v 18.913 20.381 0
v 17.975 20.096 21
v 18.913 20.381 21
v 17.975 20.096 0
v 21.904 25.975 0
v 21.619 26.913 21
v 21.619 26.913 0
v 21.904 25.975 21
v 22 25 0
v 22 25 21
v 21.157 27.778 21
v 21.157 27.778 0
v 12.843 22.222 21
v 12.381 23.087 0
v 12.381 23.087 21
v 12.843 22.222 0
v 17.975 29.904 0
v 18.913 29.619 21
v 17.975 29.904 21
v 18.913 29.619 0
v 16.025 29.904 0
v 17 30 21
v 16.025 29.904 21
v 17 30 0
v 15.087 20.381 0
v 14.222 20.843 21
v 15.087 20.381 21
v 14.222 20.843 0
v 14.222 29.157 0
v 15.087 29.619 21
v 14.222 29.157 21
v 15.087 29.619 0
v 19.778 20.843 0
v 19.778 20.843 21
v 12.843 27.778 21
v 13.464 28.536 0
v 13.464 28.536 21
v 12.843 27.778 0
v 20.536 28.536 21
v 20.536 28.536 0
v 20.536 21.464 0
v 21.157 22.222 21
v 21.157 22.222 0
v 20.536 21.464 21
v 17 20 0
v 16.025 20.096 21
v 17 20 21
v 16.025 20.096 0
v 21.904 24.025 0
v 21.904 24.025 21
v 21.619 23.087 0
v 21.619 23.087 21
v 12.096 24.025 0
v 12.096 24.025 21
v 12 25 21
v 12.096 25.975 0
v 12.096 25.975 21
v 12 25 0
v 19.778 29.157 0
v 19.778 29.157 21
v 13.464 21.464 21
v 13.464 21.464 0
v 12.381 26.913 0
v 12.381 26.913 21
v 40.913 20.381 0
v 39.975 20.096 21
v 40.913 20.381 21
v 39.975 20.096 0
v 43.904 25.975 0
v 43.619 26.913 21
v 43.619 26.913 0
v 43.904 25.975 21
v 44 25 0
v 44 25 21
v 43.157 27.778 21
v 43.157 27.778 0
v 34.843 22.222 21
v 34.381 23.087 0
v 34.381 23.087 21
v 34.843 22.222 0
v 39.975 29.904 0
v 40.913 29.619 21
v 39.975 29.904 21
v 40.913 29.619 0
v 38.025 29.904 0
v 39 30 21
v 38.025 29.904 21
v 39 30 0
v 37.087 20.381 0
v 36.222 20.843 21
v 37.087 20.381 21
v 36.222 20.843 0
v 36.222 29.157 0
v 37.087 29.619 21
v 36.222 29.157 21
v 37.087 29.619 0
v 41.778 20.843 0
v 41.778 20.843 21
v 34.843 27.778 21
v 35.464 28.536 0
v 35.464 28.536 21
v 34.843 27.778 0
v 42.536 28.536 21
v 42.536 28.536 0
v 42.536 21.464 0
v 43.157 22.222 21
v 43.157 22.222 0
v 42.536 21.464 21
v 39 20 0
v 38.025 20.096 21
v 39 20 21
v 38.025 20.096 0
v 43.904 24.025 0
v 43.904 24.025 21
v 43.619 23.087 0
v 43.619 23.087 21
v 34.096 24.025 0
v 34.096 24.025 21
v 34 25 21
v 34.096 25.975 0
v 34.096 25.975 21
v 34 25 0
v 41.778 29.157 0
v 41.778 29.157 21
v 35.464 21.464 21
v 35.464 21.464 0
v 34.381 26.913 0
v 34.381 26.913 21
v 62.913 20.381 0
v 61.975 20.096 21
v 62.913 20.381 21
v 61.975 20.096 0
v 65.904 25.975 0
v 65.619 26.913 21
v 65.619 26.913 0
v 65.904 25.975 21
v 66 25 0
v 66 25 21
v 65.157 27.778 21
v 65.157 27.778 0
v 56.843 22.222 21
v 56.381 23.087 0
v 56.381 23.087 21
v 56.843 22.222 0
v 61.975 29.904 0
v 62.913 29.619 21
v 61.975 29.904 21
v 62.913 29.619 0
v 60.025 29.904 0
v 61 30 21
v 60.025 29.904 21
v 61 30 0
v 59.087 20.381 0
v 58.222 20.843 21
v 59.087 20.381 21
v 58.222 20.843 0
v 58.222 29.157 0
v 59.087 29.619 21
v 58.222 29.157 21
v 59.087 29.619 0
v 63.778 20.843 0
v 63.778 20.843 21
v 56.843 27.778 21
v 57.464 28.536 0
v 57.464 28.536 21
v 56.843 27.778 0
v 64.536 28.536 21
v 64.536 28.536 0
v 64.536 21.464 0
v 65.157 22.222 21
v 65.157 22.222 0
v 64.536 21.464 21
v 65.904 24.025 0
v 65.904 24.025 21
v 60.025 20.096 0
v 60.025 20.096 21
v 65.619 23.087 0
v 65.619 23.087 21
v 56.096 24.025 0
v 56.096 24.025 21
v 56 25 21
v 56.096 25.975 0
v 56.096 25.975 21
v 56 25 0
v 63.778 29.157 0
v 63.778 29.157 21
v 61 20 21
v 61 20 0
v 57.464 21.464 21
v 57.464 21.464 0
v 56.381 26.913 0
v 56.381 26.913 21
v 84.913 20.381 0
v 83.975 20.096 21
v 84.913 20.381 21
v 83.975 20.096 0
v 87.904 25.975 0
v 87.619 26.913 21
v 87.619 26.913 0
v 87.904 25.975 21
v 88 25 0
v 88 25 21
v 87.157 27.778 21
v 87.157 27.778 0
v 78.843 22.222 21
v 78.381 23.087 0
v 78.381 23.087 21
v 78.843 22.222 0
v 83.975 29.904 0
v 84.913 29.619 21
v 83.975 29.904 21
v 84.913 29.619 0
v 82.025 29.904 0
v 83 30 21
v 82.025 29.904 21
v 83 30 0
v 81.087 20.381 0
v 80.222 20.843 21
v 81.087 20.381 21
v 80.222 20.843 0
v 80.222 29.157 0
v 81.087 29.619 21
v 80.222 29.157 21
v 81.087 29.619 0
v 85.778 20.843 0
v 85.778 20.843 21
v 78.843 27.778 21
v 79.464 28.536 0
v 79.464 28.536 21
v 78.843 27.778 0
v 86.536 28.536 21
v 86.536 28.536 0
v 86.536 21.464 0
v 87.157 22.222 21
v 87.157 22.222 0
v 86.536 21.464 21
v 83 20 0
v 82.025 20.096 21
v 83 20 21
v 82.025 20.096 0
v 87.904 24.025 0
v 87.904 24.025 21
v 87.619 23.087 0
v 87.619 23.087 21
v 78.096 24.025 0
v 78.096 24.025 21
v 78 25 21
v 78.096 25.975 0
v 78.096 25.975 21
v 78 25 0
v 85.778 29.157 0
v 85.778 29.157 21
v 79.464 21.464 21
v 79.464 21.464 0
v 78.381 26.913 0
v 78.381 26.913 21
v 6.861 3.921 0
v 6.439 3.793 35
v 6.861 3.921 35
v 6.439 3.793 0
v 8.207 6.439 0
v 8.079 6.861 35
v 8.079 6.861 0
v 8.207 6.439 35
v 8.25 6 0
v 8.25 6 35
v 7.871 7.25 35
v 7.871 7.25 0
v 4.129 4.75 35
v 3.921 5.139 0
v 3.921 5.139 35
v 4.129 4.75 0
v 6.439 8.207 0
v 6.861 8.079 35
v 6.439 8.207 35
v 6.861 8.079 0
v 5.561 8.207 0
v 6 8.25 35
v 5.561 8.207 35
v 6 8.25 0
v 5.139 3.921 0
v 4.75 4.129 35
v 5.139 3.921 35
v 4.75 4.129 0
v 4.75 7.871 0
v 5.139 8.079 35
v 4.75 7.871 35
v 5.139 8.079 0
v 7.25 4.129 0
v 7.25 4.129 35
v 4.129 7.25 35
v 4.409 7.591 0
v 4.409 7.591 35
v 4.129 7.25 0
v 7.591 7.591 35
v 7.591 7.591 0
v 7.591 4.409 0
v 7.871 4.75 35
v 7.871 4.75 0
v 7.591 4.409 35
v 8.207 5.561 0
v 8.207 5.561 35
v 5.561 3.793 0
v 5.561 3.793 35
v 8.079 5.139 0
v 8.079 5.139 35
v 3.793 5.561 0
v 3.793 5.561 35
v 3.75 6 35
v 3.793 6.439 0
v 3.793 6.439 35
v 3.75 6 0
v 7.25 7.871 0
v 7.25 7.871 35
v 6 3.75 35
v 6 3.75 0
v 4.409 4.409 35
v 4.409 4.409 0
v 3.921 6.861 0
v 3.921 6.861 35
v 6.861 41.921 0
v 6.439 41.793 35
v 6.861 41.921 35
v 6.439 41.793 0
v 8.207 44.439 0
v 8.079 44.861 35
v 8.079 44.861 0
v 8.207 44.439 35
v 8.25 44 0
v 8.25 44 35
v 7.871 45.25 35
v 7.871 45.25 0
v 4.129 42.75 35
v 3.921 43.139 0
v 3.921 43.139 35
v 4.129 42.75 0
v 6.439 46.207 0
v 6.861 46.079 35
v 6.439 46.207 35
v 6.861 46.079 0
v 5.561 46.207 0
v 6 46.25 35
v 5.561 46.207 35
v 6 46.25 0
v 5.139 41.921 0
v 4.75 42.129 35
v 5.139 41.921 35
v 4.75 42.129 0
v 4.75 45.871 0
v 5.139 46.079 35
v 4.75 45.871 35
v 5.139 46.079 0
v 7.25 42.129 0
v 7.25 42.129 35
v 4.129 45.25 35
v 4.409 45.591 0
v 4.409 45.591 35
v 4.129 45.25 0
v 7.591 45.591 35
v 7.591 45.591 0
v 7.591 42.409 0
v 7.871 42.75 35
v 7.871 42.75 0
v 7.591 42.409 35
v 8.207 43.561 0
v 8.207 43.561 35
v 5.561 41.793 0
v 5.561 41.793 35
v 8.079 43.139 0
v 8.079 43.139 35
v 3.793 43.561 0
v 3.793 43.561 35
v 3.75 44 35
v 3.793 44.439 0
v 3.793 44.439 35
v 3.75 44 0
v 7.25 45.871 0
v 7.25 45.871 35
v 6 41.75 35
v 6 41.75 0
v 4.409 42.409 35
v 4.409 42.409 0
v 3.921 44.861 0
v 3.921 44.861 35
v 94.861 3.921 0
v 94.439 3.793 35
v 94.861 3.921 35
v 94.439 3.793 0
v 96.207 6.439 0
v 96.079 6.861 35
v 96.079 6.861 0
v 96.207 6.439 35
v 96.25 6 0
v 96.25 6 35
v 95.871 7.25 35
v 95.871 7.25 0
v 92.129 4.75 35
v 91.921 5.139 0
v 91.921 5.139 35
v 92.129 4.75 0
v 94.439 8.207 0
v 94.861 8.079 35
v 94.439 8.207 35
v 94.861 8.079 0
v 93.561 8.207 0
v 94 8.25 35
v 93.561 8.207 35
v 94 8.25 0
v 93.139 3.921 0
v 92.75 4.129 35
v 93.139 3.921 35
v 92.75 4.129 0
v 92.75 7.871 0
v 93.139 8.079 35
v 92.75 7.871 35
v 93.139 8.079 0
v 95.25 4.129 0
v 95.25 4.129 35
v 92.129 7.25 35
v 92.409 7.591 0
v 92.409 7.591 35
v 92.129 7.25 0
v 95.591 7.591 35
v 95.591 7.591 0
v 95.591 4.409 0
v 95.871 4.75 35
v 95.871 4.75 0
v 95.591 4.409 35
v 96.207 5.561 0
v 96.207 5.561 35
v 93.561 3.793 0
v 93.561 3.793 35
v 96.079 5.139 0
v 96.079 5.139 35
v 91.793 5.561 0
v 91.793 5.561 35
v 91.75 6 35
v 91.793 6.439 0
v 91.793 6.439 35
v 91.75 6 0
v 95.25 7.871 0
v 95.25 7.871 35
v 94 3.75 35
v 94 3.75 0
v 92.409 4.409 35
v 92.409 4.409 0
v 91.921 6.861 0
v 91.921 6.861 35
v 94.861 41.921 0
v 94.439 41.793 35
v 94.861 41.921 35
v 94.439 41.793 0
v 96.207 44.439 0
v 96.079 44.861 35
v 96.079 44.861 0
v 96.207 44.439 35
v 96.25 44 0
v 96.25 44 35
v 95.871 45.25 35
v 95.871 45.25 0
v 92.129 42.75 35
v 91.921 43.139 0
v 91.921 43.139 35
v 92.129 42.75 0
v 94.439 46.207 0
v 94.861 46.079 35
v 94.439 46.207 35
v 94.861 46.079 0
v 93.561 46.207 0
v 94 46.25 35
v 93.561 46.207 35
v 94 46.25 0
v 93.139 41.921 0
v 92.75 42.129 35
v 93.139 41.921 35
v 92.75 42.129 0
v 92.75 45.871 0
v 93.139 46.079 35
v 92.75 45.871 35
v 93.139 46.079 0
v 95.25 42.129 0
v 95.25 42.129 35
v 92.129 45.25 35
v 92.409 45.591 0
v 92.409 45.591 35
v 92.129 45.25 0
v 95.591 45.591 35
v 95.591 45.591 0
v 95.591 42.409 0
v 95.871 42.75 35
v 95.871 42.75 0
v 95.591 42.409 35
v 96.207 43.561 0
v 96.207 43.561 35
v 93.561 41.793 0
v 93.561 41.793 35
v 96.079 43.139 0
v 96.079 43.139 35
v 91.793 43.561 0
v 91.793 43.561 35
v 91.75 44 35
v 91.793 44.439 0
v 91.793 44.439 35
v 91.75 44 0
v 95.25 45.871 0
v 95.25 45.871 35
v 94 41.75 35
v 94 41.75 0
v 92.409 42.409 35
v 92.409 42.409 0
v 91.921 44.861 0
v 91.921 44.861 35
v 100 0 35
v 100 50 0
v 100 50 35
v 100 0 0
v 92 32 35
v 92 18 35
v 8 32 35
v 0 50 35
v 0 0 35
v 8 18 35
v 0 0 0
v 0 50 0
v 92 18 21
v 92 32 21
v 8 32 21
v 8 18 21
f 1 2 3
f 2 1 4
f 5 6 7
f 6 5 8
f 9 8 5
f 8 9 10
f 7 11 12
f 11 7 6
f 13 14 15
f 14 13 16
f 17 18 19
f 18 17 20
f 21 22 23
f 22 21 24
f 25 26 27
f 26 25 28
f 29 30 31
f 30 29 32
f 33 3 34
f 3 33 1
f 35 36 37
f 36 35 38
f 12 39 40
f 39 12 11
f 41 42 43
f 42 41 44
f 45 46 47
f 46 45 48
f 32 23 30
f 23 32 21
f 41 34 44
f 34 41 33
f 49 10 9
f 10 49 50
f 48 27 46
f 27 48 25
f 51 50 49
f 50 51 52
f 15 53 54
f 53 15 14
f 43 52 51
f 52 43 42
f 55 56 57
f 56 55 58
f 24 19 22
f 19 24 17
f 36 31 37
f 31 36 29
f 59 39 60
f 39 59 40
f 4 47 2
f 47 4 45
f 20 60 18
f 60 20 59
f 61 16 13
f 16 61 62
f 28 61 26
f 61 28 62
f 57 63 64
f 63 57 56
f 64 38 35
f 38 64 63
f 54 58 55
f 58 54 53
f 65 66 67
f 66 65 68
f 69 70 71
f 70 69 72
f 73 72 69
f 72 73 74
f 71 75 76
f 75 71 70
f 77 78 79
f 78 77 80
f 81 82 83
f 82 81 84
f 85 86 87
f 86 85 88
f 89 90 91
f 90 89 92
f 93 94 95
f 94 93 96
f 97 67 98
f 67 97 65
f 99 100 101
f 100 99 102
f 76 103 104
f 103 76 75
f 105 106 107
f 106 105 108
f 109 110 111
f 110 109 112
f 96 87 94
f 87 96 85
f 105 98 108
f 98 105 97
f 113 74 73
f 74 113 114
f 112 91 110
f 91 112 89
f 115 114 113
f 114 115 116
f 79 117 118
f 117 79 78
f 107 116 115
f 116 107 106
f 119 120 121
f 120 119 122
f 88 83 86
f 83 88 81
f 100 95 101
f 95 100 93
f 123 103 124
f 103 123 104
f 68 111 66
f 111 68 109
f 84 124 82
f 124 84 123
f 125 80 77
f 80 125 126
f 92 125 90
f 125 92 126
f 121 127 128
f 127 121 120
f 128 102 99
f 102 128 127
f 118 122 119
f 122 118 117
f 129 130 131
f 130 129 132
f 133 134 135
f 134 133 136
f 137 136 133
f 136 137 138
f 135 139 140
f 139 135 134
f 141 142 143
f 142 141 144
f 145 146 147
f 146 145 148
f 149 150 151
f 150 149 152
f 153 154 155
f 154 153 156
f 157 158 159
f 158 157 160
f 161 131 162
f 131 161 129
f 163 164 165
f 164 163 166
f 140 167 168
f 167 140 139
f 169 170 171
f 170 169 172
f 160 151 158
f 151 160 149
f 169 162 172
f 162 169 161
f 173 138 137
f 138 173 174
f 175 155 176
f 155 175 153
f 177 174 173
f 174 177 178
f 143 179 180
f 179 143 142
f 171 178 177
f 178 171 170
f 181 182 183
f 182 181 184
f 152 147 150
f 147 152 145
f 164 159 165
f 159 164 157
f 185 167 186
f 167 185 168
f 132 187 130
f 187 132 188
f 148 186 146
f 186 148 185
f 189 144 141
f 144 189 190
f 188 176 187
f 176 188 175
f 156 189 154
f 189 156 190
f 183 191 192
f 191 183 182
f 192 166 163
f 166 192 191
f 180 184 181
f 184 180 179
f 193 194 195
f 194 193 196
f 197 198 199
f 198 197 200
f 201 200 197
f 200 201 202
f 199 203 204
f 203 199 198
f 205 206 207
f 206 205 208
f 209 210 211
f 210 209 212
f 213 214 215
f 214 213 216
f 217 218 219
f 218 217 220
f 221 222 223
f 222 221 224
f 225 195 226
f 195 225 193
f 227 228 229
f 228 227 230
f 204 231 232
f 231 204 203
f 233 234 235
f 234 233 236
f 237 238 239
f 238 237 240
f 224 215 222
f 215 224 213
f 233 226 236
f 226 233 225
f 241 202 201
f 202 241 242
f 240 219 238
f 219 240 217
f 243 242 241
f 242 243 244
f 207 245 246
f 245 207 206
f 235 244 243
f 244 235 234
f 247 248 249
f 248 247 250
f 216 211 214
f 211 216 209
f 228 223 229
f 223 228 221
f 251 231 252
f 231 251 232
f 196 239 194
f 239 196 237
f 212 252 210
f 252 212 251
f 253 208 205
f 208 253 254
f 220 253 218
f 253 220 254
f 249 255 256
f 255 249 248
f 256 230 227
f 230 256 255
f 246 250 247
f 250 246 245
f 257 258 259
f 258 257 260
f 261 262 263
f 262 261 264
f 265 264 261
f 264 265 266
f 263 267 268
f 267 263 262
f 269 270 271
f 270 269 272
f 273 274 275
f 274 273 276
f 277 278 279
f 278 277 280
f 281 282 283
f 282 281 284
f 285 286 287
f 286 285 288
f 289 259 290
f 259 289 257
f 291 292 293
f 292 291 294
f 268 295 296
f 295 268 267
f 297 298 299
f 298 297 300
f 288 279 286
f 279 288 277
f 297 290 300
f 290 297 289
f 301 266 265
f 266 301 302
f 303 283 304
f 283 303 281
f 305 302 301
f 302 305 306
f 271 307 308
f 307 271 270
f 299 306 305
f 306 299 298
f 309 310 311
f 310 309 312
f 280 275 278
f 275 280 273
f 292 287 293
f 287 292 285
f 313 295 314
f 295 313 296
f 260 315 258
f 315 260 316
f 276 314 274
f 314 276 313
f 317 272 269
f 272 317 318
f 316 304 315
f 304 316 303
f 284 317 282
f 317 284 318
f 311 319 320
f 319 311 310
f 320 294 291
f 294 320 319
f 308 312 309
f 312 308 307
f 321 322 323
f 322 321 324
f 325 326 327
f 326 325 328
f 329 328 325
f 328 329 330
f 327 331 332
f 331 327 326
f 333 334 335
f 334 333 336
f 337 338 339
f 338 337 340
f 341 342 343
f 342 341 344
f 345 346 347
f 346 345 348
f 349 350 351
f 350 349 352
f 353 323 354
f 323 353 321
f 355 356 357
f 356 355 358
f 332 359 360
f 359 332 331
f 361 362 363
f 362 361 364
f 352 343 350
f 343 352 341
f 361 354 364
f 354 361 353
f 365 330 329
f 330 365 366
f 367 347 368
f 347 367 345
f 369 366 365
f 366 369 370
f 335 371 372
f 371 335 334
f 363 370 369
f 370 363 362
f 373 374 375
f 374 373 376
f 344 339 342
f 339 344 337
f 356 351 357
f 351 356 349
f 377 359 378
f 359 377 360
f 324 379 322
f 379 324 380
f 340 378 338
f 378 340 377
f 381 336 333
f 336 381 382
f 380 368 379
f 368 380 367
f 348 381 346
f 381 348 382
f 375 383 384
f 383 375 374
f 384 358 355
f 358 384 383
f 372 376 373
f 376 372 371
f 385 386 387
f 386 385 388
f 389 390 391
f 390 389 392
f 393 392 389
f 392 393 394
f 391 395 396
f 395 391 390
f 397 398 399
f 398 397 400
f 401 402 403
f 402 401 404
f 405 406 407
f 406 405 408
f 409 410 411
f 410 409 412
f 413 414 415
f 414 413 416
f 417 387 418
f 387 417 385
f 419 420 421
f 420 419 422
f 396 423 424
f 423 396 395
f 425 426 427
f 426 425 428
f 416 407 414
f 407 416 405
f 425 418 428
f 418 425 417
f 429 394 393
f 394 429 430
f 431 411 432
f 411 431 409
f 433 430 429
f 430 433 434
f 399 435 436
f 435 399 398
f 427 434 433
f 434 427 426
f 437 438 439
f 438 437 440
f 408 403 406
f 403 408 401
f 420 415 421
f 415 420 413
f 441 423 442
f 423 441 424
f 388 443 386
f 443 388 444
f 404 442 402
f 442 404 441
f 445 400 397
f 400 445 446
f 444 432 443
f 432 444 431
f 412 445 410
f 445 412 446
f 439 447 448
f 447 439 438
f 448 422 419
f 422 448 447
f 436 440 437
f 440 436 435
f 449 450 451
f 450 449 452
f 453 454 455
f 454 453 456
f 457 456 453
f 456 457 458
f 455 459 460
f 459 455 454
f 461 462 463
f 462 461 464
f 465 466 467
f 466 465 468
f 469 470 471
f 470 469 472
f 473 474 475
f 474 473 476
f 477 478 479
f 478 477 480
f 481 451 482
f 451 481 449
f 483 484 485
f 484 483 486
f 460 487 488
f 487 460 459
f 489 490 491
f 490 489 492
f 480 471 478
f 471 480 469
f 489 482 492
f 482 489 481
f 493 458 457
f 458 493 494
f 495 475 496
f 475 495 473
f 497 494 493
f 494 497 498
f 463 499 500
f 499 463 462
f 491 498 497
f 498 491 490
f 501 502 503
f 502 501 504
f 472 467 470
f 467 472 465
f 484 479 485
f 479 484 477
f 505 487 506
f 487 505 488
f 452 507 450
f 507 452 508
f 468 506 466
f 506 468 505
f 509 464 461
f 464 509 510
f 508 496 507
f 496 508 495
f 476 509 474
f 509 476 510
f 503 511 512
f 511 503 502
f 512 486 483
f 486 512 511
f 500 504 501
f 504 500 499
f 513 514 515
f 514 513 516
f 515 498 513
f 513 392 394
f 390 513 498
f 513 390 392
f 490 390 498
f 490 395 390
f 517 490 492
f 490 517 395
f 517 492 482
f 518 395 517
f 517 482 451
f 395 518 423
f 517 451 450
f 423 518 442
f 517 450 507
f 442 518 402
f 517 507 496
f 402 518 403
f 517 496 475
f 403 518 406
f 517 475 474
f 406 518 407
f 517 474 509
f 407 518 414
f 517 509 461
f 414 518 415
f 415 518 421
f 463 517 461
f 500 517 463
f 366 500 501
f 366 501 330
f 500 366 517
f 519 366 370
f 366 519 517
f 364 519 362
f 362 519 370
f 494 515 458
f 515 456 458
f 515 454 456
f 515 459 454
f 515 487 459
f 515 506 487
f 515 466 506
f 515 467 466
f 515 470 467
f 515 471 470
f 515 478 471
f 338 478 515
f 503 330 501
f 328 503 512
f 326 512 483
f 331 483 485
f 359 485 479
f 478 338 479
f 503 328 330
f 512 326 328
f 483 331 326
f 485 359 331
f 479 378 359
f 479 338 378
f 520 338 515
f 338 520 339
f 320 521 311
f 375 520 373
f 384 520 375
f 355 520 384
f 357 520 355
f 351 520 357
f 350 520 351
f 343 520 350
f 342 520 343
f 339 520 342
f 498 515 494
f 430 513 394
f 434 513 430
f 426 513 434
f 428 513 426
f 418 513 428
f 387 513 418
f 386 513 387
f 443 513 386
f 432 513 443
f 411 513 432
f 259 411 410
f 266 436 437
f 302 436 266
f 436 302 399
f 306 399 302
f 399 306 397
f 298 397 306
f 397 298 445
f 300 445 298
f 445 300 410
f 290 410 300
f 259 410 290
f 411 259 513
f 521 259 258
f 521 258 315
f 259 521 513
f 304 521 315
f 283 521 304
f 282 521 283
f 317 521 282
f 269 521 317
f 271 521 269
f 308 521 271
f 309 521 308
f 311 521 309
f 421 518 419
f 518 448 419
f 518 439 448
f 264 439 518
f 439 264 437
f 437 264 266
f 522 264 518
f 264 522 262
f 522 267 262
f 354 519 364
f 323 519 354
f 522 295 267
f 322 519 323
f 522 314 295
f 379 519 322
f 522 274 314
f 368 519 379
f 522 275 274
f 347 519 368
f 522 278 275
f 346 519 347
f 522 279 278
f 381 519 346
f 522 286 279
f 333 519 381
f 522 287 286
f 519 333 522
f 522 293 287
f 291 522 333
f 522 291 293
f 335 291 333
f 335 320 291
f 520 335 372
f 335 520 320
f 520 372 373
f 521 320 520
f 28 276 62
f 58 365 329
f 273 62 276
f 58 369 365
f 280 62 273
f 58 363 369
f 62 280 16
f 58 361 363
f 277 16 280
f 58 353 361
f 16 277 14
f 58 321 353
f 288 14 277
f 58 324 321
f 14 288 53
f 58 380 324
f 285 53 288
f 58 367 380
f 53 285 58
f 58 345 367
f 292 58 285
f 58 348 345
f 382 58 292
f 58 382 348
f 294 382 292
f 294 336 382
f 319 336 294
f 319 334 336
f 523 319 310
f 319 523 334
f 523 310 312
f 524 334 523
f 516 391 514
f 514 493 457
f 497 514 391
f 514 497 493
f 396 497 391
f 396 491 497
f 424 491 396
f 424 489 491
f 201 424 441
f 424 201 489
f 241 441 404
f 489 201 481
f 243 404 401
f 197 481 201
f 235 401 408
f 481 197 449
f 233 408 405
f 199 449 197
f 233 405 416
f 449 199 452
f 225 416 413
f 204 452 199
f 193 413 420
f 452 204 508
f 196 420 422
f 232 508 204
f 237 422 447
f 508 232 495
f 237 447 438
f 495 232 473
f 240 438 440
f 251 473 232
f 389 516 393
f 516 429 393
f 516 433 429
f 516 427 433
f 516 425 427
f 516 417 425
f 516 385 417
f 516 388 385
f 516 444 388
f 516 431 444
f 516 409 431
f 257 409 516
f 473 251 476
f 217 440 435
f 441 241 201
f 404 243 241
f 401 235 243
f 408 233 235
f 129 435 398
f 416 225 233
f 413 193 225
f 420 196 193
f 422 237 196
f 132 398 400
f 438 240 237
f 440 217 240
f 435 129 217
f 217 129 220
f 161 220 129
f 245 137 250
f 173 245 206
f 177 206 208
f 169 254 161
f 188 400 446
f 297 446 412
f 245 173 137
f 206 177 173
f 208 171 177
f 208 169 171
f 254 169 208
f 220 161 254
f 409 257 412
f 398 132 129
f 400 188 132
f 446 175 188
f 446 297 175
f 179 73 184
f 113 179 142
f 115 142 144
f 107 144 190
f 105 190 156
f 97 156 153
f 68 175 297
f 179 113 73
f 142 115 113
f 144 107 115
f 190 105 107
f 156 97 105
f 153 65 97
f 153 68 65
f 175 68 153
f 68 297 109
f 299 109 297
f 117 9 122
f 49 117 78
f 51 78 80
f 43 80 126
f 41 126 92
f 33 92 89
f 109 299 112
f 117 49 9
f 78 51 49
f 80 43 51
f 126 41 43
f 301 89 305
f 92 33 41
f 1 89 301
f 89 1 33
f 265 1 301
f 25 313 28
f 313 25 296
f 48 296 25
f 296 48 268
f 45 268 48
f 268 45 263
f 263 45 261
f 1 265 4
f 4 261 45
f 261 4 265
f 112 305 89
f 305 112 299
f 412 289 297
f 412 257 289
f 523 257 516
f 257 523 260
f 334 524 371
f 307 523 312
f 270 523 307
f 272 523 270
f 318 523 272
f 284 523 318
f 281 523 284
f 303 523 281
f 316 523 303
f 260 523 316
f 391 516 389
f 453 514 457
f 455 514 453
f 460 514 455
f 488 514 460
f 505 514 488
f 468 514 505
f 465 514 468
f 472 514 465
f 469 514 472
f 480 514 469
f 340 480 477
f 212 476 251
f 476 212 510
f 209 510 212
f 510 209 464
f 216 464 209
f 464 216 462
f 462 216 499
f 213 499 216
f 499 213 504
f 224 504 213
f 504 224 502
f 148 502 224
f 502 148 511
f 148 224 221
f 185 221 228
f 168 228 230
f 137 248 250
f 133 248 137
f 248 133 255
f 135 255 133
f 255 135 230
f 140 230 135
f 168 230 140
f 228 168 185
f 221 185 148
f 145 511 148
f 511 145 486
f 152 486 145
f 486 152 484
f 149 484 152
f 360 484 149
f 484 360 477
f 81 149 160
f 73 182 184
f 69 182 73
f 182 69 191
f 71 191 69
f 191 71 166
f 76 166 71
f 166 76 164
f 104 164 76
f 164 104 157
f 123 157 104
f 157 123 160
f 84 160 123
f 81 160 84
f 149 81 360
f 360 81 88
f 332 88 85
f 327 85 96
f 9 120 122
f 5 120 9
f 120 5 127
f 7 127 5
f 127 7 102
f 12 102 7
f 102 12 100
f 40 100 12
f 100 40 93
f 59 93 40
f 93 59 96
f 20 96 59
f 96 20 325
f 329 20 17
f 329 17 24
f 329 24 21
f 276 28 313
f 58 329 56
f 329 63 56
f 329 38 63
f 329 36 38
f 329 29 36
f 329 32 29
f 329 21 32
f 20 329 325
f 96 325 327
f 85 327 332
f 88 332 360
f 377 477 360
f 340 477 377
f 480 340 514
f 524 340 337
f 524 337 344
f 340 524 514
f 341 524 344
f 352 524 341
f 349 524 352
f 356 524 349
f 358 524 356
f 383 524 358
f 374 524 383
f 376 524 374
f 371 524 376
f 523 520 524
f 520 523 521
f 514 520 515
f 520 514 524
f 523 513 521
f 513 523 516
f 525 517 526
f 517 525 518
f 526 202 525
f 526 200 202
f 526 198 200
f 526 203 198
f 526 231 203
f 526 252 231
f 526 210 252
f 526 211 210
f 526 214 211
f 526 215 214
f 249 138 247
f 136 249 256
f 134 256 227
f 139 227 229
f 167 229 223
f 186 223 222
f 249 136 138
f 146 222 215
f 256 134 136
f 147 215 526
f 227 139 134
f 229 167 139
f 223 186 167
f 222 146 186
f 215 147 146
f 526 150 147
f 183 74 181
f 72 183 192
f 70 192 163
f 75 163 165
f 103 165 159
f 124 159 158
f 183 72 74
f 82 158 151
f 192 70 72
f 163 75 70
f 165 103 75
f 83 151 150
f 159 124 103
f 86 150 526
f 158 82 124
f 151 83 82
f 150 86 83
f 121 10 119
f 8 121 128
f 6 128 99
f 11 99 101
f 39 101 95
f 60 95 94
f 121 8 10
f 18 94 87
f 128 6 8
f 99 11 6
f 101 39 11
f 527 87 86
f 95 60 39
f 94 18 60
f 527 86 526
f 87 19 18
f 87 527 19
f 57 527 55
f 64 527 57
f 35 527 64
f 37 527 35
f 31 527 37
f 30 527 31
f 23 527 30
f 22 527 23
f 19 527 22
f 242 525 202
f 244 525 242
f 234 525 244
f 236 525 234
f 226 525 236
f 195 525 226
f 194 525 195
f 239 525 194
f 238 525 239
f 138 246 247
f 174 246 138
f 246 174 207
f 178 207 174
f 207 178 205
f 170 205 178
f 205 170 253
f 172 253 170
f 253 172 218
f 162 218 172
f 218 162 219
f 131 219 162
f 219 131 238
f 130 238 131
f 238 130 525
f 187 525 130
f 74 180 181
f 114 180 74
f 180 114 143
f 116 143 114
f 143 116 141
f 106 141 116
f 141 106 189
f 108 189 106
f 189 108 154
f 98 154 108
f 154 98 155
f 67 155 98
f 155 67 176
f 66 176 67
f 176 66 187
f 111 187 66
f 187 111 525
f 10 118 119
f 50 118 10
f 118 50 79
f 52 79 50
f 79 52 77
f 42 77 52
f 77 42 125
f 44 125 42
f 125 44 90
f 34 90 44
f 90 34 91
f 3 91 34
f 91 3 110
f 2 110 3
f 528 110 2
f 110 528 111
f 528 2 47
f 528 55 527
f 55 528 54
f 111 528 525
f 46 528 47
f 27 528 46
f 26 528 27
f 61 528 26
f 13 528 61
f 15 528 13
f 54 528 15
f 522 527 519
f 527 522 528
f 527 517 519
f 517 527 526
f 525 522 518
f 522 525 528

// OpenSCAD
$fn = 32;

// ----------------------------------------------------------------------
// Manifold block: gallery_top manifold
// ----------------------------------------------------------------------

// --- parameters (mm) ---
block_l = 100;            // block length, X
block_w = 50;             // block width, Y
block_h = 35;             // block height, Z
port_d = 10;              // port bore diameter
port_pitch = 22;          // port pitch along X
gallery_d = 14;           // top gallery width, Y
gallery_depth = 14;       // gallery pocket depth
wall_p = 8;               // gallery end wall thickness, X
mnt_d = 4.5;              // mounting hole diameter
mnt_in = 6;               // mounting hole inset from the edges
fit_tol = 0.05;           // tolerance for press fits, mm
free_tol = 0.2;           // tolerance for clearance fits, mm

n_ports = 4;  // ports in the row
port_x0 = (block_l - (n_ports - 1) * port_pitch) / 2;  // first port X

difference() {
  cube([block_l, block_w, block_h]);
  for (i = [0 : n_ports - 1])
    translate([port_x0 + i * port_pitch, block_w / 2, -1])
      cylinder(h = block_h + 2, d = port_d);
  translate([wall_p, block_w / 2 - gallery_d / 2, block_h - gallery_depth])
    cube([block_l - 2 * wall_p, gallery_d, gallery_depth + 1]);
  for (cx = [mnt_in, block_l - mnt_in])
    for (cy = [mnt_in, block_w - mnt_in])
      translate([cx, cy, -1]) cylinder(h = block_h + 2, d = mnt_d);
}
